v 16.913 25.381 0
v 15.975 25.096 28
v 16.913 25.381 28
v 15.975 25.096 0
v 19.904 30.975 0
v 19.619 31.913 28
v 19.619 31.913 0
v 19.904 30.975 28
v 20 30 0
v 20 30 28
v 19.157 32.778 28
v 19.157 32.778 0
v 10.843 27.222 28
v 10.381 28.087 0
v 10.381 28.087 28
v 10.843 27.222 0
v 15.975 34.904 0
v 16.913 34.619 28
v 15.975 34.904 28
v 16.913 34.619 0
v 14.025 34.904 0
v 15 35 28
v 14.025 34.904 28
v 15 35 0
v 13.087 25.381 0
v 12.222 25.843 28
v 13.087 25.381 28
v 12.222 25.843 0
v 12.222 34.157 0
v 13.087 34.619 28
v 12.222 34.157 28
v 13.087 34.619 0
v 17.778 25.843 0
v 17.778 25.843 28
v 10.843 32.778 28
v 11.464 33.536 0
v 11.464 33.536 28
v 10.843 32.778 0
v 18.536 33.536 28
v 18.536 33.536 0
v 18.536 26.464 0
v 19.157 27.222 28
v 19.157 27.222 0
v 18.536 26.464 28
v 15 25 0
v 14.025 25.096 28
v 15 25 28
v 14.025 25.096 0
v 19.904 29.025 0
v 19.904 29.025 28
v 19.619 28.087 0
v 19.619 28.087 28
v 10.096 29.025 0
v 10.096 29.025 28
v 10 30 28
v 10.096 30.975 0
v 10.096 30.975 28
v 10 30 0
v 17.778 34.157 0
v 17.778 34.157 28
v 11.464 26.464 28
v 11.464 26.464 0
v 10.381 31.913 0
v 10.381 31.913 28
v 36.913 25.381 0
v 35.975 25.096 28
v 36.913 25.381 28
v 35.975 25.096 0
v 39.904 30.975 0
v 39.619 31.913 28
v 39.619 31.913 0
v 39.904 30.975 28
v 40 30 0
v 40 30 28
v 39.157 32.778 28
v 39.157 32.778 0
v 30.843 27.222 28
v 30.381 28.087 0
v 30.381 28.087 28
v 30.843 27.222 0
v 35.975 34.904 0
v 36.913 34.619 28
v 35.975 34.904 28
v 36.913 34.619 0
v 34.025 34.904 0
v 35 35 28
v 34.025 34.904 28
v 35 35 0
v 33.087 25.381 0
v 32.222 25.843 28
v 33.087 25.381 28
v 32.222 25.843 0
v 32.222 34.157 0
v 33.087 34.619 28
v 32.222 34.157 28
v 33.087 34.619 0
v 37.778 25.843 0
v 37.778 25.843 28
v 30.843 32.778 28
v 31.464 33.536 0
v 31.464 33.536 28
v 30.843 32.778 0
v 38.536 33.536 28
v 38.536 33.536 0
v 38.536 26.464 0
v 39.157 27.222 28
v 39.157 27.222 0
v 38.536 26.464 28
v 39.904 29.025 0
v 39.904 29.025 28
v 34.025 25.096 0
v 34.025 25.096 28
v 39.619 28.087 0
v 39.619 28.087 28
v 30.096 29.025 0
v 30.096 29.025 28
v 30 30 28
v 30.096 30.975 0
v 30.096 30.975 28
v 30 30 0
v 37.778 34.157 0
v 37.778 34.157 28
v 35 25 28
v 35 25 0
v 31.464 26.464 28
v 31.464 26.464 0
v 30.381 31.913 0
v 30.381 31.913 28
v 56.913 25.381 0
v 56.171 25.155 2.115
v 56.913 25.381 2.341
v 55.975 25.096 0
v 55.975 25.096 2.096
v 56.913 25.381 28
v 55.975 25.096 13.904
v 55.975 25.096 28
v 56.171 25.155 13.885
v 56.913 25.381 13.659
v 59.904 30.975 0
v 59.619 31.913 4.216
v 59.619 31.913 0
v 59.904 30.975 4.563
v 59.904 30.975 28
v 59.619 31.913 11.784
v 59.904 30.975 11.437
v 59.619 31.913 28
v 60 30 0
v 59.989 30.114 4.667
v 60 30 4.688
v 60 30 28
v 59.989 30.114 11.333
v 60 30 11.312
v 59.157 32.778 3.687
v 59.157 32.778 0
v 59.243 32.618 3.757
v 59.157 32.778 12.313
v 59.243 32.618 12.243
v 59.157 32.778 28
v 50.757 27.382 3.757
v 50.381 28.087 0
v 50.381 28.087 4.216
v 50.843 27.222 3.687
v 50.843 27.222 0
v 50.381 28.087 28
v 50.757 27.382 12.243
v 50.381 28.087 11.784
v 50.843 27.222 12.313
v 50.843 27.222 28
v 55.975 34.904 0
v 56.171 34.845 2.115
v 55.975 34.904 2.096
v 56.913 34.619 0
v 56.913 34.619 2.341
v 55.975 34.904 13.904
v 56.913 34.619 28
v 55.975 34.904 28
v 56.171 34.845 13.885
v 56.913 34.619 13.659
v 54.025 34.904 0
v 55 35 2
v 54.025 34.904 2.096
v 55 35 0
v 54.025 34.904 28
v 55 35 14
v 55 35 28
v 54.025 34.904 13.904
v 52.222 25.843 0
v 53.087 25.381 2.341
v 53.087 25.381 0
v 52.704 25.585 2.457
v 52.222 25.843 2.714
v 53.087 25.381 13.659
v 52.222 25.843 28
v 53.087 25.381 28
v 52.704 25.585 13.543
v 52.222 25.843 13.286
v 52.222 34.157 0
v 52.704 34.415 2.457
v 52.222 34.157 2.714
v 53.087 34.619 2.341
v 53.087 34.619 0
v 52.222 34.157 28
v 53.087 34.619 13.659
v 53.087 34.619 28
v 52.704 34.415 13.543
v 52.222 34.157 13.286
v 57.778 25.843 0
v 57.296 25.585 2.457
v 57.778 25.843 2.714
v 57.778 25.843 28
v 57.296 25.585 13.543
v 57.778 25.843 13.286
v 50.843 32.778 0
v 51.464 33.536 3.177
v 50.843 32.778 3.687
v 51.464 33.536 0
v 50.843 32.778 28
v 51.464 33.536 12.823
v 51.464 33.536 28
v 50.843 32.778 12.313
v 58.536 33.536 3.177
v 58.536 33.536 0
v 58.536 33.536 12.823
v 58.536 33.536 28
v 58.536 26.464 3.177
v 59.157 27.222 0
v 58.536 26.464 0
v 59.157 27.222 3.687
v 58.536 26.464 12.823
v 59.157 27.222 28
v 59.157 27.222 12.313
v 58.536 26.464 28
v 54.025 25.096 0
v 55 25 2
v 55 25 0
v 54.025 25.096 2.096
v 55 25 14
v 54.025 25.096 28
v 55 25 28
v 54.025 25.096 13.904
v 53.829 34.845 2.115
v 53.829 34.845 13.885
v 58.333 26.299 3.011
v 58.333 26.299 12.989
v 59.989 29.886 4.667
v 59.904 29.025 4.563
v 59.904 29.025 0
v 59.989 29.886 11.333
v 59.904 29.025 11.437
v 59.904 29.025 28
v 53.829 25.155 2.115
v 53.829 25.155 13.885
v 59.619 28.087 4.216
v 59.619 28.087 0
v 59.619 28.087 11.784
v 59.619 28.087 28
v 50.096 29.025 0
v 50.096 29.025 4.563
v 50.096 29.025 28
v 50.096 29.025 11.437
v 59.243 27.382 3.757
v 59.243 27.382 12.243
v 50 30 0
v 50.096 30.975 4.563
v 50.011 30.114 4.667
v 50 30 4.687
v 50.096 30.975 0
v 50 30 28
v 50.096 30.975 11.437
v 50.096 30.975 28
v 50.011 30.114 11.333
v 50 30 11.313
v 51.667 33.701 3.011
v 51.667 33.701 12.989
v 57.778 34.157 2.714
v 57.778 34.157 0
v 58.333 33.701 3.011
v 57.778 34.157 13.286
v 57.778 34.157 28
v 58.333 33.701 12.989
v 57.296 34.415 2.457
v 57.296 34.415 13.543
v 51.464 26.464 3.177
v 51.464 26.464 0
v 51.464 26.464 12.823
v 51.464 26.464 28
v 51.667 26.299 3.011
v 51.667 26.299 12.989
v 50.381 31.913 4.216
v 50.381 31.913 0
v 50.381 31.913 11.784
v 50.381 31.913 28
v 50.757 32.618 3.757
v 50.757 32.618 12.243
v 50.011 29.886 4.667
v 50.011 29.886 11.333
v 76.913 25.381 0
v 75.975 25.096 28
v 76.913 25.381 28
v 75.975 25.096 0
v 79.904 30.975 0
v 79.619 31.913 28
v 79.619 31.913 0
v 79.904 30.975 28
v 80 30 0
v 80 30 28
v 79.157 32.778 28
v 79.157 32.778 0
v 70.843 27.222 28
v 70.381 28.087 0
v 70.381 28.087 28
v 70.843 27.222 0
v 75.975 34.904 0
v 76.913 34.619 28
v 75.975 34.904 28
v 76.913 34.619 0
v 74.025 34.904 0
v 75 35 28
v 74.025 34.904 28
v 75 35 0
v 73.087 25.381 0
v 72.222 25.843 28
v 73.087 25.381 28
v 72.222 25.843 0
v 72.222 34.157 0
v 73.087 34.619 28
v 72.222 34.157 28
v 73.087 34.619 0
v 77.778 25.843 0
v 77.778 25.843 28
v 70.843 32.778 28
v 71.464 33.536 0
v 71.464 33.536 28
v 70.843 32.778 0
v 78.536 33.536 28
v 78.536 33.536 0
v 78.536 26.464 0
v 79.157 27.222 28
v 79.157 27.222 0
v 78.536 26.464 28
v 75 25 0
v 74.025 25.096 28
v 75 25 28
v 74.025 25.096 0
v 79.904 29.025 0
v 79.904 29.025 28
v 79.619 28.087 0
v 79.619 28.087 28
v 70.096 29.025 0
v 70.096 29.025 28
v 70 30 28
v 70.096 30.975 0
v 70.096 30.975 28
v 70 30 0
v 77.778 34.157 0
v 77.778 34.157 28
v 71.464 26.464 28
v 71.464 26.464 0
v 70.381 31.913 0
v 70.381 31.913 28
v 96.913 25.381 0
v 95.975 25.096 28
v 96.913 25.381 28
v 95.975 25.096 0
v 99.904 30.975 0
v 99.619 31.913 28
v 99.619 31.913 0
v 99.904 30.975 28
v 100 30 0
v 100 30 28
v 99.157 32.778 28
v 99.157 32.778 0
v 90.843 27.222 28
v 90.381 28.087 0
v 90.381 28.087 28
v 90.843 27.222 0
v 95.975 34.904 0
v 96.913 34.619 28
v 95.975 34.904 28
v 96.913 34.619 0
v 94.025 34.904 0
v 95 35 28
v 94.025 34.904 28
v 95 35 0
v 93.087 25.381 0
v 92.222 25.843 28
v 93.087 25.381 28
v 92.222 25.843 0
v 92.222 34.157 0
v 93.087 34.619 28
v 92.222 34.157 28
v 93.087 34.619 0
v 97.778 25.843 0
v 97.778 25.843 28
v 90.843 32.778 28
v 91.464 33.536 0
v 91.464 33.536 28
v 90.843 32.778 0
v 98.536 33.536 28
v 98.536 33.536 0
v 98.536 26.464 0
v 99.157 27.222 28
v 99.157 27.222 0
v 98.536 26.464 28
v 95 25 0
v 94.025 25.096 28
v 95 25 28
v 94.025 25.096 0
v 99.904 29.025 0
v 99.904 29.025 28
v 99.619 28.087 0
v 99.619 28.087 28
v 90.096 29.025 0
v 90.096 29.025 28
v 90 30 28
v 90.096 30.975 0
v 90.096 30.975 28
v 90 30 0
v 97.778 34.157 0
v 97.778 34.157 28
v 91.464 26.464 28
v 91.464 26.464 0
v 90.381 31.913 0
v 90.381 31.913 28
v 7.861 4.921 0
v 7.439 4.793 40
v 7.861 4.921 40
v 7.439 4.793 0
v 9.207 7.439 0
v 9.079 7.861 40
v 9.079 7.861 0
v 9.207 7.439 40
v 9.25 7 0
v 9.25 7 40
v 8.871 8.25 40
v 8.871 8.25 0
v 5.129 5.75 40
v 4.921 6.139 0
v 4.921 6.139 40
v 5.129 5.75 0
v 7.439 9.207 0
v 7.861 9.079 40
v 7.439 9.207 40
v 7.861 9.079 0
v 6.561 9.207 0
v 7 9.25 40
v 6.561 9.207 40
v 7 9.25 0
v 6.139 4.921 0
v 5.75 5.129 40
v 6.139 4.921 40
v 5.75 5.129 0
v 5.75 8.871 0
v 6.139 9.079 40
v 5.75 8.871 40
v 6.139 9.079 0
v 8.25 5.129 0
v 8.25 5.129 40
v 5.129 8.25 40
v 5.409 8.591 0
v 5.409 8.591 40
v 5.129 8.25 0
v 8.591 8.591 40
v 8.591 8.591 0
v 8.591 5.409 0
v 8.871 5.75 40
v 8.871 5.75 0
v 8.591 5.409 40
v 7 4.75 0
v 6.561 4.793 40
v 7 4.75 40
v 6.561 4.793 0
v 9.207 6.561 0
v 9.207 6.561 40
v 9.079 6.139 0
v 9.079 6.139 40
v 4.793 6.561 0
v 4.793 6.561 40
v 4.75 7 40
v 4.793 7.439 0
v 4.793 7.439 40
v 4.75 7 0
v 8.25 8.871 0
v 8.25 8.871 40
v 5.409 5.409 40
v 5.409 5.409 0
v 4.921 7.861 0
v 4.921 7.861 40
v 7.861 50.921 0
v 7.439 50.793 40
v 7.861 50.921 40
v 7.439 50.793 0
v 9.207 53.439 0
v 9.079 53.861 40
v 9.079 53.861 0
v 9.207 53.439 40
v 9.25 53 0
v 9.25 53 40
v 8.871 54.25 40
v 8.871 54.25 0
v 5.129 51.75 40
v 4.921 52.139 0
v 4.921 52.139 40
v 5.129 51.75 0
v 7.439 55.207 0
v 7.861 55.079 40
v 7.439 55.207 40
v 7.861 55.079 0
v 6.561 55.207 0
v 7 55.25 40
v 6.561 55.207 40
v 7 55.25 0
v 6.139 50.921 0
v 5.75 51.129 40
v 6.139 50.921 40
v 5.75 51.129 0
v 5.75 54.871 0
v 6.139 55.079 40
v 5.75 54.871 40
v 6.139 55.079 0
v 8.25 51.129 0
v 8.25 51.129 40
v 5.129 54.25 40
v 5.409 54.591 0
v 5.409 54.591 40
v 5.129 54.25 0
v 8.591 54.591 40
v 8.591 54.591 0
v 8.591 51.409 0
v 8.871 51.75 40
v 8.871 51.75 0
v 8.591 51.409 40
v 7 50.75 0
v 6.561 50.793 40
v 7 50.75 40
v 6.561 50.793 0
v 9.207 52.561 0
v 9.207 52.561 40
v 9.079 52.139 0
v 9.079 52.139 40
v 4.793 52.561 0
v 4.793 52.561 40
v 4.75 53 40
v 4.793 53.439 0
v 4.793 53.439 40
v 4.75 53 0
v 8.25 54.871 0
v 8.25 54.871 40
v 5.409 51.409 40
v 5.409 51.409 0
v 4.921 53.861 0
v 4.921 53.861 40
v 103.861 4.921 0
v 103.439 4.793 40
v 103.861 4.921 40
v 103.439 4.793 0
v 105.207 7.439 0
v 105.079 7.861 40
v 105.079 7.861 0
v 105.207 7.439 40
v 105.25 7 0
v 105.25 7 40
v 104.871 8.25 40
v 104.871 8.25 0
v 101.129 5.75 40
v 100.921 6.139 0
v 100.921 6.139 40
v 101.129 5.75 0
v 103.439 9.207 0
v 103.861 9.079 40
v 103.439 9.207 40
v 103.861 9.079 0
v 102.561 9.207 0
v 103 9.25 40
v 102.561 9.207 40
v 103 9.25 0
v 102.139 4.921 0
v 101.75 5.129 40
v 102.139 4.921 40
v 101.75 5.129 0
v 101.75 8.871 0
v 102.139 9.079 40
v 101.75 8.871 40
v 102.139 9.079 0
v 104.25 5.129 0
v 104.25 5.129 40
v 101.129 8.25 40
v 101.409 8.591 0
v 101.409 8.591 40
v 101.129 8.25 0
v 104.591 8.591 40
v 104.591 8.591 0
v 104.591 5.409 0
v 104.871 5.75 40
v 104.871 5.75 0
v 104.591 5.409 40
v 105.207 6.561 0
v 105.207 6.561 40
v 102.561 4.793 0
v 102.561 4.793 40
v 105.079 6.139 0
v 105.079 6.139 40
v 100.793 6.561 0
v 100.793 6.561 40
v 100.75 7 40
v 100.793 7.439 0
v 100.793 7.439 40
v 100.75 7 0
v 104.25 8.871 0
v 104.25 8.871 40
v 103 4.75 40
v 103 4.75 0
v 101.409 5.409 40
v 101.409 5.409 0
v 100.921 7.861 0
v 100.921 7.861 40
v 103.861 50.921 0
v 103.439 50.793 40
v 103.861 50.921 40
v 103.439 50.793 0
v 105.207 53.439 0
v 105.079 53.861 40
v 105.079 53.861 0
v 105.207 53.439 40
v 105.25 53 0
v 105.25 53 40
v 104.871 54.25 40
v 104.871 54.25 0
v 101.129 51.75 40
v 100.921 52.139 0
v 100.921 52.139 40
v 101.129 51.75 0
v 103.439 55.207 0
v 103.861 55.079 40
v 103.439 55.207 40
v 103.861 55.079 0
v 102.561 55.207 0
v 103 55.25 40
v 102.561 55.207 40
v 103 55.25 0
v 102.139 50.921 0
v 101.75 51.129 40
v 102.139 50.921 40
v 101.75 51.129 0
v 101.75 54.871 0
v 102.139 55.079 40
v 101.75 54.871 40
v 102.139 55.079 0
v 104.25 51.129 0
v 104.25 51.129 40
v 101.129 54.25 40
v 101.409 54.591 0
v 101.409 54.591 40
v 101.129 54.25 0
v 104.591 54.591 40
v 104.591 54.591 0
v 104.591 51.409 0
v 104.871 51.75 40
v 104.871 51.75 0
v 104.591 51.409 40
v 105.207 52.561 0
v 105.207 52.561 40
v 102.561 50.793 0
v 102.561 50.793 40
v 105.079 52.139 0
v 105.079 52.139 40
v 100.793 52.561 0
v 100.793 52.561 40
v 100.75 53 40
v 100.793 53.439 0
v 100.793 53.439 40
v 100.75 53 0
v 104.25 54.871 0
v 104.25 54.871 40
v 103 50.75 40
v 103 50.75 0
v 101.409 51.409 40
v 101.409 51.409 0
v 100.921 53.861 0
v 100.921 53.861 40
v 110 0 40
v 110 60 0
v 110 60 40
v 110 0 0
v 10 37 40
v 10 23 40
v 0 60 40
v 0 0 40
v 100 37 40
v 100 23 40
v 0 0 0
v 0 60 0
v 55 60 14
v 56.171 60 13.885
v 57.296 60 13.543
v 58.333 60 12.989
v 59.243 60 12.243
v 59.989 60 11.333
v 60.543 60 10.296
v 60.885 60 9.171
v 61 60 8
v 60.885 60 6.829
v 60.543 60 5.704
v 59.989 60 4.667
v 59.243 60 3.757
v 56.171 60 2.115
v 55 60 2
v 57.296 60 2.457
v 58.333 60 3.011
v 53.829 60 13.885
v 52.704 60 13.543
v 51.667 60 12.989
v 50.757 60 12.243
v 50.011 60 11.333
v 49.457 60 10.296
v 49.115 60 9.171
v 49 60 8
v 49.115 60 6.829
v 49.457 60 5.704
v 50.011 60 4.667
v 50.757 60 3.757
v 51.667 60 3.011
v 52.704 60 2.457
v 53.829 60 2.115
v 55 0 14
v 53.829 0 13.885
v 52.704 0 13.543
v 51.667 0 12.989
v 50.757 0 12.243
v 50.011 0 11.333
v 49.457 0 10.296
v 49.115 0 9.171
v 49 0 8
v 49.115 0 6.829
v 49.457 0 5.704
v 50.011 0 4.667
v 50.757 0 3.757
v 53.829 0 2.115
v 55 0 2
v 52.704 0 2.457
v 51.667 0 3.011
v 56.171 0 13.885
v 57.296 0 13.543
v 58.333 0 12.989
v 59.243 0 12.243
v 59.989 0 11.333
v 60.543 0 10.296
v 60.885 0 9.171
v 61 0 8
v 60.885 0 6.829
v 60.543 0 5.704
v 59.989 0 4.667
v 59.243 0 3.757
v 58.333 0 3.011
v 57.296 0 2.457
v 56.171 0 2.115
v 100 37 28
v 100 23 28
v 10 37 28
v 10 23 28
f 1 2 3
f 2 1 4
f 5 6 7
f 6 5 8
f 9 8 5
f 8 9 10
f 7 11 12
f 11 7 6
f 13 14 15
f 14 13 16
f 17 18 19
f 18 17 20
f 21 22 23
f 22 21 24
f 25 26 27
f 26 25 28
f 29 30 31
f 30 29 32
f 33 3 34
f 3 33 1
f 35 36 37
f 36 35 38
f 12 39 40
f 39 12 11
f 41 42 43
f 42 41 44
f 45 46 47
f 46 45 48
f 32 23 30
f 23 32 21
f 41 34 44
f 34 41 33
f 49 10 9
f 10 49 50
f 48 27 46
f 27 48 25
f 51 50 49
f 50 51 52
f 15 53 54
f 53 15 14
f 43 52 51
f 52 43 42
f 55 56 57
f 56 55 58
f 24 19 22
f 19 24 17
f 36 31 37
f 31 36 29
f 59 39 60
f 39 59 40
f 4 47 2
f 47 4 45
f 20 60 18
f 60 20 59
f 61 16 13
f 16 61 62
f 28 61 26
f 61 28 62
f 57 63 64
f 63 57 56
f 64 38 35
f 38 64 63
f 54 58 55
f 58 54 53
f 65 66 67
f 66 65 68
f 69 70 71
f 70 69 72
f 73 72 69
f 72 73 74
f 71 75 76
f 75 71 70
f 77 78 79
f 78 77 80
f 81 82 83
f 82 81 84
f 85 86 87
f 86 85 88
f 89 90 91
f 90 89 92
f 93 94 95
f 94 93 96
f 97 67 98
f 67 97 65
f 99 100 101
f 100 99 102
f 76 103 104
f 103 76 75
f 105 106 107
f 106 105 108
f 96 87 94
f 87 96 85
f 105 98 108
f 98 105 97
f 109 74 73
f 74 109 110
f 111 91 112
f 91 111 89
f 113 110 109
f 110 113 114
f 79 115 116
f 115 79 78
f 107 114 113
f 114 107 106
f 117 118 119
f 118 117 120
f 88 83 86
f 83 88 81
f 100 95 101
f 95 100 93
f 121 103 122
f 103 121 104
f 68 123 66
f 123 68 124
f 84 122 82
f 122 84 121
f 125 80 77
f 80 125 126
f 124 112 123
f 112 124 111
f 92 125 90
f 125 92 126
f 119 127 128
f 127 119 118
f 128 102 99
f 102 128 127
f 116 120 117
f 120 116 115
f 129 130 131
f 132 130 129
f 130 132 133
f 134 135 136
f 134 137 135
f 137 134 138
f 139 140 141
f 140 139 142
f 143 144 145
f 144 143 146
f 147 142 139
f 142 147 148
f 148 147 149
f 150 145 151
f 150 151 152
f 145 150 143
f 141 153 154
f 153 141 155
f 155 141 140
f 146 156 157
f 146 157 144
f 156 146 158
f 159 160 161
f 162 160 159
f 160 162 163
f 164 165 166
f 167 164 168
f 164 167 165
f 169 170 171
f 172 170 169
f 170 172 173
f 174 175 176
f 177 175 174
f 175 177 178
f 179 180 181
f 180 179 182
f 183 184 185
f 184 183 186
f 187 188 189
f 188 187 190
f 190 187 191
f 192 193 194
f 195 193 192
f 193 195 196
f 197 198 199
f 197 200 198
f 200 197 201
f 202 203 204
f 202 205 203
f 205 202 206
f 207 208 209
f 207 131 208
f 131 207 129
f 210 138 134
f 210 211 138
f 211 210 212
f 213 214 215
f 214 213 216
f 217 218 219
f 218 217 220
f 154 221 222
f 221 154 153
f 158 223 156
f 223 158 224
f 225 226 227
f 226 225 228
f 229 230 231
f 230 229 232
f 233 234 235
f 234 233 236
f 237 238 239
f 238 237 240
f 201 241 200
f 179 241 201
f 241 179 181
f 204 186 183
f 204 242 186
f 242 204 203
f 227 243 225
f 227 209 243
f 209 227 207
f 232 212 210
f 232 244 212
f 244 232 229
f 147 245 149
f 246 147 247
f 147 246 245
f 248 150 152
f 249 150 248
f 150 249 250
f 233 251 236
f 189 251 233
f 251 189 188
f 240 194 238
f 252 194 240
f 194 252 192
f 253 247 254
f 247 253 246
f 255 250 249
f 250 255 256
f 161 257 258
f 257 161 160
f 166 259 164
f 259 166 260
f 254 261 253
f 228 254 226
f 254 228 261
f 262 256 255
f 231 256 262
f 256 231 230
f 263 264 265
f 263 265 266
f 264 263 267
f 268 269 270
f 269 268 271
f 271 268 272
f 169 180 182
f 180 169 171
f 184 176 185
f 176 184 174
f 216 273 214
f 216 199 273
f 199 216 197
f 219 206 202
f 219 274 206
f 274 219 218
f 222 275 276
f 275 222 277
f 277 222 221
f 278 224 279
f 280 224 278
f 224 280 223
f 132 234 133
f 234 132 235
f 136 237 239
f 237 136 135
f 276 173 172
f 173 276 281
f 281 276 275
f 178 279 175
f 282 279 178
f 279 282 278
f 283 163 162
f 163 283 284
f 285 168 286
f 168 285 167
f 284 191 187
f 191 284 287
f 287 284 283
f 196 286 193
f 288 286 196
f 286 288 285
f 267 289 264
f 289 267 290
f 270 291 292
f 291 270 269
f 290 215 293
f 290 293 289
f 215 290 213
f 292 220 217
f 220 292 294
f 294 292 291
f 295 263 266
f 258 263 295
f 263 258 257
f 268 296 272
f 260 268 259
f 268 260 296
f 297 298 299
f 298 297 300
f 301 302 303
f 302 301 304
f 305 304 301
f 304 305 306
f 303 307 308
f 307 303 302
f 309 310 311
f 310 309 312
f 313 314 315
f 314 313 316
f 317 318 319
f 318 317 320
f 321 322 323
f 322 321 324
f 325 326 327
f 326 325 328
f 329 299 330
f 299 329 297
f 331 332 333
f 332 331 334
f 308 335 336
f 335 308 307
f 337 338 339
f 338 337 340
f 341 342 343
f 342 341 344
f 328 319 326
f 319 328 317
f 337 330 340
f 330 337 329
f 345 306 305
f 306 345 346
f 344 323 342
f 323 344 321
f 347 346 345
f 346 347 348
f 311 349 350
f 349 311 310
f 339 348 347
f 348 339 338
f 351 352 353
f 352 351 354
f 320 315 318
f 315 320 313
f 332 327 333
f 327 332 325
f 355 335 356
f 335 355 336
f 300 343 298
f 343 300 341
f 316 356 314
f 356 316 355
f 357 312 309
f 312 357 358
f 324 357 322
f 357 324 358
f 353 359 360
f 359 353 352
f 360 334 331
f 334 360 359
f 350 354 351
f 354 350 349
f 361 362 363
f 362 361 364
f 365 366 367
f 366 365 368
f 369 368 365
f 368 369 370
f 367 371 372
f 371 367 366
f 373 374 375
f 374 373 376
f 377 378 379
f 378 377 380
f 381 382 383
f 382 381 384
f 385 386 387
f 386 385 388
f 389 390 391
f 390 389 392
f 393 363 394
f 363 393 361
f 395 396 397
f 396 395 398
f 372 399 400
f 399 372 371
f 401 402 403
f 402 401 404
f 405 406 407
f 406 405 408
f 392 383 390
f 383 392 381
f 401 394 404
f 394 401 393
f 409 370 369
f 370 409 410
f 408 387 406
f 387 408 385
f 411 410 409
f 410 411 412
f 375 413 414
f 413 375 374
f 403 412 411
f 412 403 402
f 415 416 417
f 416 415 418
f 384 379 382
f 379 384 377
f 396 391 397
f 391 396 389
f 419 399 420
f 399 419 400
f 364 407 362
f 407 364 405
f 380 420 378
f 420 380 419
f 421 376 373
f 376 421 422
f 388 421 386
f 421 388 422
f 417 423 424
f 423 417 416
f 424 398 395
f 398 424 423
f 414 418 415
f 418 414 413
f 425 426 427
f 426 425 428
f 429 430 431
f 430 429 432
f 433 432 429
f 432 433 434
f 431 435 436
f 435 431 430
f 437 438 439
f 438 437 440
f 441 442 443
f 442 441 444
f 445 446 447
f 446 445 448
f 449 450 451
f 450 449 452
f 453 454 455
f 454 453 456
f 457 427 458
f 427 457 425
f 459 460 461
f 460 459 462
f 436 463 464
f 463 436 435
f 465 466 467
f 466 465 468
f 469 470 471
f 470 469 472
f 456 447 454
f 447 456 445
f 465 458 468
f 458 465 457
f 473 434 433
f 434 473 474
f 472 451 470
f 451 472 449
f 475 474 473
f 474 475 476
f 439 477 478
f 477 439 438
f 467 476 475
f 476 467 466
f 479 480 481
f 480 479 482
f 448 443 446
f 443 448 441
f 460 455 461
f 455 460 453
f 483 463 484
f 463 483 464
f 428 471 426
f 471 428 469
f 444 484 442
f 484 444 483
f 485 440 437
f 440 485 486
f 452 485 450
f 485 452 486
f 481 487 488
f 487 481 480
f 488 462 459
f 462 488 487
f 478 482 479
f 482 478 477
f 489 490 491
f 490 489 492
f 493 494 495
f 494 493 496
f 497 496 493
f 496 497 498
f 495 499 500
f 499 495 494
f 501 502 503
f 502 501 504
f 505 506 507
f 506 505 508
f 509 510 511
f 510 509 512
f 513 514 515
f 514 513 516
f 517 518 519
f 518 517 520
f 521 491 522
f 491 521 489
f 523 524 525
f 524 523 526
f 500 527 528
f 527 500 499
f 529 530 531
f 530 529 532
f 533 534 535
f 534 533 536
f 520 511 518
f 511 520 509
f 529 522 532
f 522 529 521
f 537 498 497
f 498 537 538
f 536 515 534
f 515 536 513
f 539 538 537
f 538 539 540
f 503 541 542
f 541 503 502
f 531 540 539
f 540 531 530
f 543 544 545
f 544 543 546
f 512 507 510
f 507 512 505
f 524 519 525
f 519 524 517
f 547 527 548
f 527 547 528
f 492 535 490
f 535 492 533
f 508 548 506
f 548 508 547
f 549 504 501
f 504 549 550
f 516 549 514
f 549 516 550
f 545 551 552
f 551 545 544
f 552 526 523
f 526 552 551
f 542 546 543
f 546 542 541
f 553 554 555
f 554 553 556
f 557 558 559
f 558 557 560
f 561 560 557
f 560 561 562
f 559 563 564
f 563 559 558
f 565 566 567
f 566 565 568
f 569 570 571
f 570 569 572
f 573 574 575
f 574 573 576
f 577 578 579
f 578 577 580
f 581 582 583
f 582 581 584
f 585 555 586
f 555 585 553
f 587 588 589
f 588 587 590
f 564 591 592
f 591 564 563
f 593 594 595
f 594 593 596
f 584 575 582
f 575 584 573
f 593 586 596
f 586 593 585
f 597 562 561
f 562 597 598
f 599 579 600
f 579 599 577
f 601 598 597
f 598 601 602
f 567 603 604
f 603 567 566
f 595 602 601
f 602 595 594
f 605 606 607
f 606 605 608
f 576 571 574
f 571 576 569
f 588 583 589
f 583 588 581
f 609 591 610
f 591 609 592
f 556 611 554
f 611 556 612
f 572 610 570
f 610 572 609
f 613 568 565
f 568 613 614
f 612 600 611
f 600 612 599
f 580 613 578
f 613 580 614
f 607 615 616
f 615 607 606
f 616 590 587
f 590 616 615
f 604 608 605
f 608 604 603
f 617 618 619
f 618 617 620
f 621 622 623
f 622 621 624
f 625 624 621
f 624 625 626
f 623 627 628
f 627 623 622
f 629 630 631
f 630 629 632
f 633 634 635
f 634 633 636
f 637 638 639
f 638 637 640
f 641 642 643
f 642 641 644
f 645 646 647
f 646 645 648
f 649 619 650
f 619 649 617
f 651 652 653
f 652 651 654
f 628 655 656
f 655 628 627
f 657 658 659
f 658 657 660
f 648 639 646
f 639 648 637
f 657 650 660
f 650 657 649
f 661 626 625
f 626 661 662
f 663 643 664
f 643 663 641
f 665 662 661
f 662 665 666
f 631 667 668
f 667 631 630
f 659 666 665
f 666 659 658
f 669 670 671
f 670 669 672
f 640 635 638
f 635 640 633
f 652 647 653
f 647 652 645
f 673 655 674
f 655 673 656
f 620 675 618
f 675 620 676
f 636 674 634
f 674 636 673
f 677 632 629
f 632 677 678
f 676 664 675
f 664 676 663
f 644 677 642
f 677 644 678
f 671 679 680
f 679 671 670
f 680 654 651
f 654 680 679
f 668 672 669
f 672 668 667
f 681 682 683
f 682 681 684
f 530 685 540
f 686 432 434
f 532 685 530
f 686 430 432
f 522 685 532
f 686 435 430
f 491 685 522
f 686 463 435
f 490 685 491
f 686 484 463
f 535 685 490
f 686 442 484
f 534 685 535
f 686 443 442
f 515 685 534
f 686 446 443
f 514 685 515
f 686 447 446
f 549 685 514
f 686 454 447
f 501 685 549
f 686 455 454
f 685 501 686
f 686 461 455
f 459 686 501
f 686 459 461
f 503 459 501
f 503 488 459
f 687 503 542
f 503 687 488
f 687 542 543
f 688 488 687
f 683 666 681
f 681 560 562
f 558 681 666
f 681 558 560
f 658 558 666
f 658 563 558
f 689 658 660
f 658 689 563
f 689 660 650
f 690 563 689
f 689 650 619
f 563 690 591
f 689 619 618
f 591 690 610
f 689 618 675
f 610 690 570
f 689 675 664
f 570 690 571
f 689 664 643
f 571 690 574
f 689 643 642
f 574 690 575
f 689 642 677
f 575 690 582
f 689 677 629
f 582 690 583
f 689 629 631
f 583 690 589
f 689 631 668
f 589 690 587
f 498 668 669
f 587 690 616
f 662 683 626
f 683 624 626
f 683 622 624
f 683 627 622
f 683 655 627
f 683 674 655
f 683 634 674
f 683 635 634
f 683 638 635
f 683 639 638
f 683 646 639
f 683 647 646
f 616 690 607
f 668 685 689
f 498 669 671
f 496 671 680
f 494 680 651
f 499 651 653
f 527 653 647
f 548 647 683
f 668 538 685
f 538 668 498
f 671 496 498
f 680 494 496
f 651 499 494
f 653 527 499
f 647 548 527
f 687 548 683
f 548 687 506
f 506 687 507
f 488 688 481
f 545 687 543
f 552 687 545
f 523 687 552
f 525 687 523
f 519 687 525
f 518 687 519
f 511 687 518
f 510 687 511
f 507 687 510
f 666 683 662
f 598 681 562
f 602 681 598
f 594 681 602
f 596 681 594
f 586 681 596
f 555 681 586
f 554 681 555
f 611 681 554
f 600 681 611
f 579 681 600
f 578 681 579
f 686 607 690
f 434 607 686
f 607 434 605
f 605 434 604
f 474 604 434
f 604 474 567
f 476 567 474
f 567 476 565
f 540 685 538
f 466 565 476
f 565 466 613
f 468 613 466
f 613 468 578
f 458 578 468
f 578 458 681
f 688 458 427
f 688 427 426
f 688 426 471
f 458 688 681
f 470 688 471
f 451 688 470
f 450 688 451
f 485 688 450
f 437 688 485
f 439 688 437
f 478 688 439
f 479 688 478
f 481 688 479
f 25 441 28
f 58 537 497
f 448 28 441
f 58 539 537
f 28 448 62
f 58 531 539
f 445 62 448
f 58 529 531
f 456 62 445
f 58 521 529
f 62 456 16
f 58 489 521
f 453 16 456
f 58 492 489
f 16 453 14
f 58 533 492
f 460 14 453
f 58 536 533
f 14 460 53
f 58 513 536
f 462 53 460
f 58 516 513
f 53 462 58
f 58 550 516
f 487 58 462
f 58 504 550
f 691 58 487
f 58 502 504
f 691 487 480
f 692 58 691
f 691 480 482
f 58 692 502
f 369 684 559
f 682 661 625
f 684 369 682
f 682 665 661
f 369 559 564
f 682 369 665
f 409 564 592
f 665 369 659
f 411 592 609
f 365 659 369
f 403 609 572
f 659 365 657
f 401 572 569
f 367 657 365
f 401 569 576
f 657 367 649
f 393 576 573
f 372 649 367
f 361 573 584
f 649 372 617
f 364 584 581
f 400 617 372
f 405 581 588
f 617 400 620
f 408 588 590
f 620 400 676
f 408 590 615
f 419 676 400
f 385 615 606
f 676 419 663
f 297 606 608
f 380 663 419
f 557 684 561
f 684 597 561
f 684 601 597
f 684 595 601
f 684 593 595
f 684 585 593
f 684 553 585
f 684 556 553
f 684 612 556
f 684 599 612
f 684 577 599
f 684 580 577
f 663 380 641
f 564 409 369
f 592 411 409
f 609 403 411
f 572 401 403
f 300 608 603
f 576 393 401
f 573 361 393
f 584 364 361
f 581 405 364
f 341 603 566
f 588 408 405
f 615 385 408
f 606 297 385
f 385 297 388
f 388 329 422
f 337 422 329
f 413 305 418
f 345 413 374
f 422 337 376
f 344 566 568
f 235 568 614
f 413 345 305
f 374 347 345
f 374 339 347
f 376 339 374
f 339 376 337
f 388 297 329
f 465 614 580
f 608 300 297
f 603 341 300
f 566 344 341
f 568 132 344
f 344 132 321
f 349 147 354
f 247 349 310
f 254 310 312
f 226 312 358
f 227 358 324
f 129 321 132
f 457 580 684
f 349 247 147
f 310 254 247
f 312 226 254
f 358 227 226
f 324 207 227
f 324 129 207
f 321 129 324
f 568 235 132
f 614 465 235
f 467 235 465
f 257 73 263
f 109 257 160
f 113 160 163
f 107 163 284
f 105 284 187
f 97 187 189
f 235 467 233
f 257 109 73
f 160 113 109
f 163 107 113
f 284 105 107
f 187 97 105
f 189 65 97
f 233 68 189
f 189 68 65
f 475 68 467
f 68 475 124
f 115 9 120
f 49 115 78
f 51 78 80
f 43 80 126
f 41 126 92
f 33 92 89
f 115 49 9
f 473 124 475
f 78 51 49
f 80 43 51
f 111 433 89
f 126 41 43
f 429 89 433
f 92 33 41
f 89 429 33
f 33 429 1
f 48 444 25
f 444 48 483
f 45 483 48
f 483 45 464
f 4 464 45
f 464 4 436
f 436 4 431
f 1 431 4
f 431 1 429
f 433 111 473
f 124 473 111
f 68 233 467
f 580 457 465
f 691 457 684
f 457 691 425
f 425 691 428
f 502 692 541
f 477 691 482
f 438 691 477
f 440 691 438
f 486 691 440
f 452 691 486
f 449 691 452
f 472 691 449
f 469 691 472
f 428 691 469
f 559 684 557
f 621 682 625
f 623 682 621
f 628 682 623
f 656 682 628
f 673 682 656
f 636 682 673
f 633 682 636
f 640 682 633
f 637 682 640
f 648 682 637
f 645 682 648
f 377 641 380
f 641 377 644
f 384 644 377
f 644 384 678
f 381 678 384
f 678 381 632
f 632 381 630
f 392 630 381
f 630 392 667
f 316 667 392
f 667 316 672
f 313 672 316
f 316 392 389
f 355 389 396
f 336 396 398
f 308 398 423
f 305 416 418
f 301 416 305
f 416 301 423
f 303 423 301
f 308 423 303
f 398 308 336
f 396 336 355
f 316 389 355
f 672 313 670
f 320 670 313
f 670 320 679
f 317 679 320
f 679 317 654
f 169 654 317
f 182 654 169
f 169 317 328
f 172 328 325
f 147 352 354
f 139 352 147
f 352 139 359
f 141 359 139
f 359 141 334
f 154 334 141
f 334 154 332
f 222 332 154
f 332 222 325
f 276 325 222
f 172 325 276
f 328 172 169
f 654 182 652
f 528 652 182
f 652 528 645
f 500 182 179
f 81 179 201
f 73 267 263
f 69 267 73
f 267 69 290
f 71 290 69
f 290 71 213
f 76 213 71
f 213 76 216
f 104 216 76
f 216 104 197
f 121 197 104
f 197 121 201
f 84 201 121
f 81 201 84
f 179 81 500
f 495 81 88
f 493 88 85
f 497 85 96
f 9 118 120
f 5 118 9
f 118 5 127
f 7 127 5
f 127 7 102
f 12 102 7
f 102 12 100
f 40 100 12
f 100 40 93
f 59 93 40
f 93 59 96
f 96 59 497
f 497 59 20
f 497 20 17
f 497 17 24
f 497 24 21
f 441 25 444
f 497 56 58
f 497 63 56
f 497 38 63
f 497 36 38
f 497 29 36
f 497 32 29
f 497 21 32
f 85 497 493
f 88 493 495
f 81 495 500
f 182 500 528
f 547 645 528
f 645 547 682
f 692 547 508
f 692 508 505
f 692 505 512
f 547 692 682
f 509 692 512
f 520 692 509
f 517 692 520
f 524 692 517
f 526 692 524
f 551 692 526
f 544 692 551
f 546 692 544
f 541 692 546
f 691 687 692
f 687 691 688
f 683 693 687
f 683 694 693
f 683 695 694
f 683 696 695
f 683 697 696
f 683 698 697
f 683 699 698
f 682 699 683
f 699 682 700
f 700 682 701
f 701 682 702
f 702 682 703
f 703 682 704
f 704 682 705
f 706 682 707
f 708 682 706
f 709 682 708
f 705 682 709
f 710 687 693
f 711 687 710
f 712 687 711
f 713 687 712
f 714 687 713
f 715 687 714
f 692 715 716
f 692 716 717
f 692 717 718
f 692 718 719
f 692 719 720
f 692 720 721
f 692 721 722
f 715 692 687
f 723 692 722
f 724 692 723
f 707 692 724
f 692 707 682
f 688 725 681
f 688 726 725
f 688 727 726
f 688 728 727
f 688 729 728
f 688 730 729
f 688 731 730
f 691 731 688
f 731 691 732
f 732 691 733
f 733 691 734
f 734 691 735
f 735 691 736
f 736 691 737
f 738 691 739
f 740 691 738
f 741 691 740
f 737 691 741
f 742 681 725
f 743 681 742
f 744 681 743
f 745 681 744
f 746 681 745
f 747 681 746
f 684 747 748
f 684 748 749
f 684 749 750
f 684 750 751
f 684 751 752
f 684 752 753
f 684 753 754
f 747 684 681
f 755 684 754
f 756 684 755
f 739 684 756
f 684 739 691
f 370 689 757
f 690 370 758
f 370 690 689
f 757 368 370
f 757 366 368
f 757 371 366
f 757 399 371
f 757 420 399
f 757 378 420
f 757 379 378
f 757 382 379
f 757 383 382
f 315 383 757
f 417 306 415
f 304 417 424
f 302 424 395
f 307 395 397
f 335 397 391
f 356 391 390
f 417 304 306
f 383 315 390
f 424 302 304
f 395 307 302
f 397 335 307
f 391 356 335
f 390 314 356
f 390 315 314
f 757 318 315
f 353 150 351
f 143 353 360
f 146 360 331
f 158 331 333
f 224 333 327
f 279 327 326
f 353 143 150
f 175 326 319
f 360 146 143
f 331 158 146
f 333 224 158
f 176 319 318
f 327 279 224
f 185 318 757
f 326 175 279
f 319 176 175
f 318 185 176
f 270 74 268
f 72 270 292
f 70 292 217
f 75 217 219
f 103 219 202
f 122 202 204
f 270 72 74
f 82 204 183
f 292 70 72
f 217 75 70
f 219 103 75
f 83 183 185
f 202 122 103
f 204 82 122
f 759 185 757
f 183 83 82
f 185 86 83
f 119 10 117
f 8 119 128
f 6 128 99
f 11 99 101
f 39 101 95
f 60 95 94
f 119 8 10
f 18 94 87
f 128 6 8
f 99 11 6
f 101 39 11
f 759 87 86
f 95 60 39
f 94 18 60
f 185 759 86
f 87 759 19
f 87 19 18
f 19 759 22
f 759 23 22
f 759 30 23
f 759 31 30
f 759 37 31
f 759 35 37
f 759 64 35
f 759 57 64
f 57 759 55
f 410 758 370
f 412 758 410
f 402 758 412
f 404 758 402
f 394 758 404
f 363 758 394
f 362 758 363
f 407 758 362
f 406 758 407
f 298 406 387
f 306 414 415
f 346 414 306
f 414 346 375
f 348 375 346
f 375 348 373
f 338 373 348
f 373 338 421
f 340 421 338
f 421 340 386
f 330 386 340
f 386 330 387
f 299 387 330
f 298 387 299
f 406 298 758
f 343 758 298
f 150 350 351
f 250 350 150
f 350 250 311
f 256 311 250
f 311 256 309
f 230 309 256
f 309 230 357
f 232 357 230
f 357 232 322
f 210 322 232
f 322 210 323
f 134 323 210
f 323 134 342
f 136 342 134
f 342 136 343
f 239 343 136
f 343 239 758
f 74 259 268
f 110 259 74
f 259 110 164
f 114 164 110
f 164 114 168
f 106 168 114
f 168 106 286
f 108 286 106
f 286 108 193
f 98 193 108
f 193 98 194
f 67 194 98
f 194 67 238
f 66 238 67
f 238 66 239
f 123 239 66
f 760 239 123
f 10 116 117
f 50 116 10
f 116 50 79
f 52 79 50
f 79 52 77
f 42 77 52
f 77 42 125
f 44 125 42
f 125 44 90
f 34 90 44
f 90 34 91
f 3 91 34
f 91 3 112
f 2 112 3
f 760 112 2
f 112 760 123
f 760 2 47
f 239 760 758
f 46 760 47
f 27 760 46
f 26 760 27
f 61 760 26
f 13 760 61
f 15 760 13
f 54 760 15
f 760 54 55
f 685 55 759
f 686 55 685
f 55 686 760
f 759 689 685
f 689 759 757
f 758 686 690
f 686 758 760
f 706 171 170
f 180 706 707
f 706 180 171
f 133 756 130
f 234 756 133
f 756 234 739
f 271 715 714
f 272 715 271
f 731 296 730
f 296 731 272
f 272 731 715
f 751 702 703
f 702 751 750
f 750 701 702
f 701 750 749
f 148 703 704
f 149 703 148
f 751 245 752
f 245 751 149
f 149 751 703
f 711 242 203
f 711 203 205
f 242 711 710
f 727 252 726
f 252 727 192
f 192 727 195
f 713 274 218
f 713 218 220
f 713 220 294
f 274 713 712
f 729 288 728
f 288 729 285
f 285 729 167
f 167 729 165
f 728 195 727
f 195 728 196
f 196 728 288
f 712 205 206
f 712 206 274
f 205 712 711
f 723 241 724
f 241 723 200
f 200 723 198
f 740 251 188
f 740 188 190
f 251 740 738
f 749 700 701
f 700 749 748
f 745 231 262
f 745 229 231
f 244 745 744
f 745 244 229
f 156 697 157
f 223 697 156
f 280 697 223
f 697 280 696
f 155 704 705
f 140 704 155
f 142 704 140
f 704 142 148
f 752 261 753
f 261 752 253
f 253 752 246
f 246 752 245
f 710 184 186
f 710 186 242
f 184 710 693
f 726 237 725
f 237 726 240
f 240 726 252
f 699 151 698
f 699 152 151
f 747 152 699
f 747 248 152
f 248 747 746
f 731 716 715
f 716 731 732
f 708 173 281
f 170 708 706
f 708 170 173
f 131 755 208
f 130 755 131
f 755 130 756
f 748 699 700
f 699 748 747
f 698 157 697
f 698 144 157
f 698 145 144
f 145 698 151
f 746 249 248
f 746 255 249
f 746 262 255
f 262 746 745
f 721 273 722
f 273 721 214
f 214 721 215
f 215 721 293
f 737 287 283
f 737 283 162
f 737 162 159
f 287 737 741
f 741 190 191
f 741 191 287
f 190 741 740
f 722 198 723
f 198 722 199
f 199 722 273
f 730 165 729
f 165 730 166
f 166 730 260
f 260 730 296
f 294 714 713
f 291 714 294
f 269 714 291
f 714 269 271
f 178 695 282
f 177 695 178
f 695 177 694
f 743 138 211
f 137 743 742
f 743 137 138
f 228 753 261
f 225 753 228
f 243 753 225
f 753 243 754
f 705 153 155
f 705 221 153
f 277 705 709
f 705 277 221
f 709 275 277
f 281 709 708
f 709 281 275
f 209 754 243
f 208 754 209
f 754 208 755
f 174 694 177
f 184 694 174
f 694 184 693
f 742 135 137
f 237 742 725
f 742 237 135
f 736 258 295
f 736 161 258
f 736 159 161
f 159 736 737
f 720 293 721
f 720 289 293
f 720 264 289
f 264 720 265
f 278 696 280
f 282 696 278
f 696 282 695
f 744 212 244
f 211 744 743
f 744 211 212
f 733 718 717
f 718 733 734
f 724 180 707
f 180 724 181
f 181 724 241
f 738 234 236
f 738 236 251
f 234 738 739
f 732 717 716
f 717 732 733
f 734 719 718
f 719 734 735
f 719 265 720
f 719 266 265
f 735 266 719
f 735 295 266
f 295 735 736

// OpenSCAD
$fn = 32;

// ----------------------------------------------------------------------
// Manifold block: side_outlet manifold
// ----------------------------------------------------------------------

// --- parameters (mm) ---
block_l = 110;            // block length, X
block_w = 60;             // block width, Y
block_h = 40;             // block height, Z
port_d = 10;              // port bore diameter
port_pitch = 20;          // port pitch along X
gallery_d = 14;           // top gallery width, Y
gallery_depth = 12;       // gallery pocket depth
wall_p = 10;              // gallery end wall thickness, X
mnt_d = 4.5;              // mounting hole diameter
mnt_in = 7;               // mounting hole inset from the edges
out_d = 12;               // outlet bore diameter
out_z = 8;                // outlet axis height

n_ports = 5;  // ports in the row
port_x0 = (block_l - (n_ports - 1) * port_pitch) / 2;  // first port X

difference() {
  cube([block_l, block_w, block_h]);
  for (i = [0 : n_ports - 1])
    translate([port_x0 + i * port_pitch, block_w / 2, -1])
      cylinder(h = block_h + 2, d = port_d);
  translate([wall_p, block_w / 2 - gallery_d / 2, block_h - gallery_depth])
    cube([block_l - 2 * wall_p, gallery_d, gallery_depth + 1]);
  for (cx = [mnt_in, block_l - mnt_in])
    for (cy = [mnt_in, block_w - mnt_in])
      translate([cx, cy, -1]) cylinder(h = block_h + 2, d = mnt_d);
  translate([block_l / 2, -1, out_z]) rotate([-90, 0, 0])
    cylinder(h = block_w + 2, d = out_d);
}
